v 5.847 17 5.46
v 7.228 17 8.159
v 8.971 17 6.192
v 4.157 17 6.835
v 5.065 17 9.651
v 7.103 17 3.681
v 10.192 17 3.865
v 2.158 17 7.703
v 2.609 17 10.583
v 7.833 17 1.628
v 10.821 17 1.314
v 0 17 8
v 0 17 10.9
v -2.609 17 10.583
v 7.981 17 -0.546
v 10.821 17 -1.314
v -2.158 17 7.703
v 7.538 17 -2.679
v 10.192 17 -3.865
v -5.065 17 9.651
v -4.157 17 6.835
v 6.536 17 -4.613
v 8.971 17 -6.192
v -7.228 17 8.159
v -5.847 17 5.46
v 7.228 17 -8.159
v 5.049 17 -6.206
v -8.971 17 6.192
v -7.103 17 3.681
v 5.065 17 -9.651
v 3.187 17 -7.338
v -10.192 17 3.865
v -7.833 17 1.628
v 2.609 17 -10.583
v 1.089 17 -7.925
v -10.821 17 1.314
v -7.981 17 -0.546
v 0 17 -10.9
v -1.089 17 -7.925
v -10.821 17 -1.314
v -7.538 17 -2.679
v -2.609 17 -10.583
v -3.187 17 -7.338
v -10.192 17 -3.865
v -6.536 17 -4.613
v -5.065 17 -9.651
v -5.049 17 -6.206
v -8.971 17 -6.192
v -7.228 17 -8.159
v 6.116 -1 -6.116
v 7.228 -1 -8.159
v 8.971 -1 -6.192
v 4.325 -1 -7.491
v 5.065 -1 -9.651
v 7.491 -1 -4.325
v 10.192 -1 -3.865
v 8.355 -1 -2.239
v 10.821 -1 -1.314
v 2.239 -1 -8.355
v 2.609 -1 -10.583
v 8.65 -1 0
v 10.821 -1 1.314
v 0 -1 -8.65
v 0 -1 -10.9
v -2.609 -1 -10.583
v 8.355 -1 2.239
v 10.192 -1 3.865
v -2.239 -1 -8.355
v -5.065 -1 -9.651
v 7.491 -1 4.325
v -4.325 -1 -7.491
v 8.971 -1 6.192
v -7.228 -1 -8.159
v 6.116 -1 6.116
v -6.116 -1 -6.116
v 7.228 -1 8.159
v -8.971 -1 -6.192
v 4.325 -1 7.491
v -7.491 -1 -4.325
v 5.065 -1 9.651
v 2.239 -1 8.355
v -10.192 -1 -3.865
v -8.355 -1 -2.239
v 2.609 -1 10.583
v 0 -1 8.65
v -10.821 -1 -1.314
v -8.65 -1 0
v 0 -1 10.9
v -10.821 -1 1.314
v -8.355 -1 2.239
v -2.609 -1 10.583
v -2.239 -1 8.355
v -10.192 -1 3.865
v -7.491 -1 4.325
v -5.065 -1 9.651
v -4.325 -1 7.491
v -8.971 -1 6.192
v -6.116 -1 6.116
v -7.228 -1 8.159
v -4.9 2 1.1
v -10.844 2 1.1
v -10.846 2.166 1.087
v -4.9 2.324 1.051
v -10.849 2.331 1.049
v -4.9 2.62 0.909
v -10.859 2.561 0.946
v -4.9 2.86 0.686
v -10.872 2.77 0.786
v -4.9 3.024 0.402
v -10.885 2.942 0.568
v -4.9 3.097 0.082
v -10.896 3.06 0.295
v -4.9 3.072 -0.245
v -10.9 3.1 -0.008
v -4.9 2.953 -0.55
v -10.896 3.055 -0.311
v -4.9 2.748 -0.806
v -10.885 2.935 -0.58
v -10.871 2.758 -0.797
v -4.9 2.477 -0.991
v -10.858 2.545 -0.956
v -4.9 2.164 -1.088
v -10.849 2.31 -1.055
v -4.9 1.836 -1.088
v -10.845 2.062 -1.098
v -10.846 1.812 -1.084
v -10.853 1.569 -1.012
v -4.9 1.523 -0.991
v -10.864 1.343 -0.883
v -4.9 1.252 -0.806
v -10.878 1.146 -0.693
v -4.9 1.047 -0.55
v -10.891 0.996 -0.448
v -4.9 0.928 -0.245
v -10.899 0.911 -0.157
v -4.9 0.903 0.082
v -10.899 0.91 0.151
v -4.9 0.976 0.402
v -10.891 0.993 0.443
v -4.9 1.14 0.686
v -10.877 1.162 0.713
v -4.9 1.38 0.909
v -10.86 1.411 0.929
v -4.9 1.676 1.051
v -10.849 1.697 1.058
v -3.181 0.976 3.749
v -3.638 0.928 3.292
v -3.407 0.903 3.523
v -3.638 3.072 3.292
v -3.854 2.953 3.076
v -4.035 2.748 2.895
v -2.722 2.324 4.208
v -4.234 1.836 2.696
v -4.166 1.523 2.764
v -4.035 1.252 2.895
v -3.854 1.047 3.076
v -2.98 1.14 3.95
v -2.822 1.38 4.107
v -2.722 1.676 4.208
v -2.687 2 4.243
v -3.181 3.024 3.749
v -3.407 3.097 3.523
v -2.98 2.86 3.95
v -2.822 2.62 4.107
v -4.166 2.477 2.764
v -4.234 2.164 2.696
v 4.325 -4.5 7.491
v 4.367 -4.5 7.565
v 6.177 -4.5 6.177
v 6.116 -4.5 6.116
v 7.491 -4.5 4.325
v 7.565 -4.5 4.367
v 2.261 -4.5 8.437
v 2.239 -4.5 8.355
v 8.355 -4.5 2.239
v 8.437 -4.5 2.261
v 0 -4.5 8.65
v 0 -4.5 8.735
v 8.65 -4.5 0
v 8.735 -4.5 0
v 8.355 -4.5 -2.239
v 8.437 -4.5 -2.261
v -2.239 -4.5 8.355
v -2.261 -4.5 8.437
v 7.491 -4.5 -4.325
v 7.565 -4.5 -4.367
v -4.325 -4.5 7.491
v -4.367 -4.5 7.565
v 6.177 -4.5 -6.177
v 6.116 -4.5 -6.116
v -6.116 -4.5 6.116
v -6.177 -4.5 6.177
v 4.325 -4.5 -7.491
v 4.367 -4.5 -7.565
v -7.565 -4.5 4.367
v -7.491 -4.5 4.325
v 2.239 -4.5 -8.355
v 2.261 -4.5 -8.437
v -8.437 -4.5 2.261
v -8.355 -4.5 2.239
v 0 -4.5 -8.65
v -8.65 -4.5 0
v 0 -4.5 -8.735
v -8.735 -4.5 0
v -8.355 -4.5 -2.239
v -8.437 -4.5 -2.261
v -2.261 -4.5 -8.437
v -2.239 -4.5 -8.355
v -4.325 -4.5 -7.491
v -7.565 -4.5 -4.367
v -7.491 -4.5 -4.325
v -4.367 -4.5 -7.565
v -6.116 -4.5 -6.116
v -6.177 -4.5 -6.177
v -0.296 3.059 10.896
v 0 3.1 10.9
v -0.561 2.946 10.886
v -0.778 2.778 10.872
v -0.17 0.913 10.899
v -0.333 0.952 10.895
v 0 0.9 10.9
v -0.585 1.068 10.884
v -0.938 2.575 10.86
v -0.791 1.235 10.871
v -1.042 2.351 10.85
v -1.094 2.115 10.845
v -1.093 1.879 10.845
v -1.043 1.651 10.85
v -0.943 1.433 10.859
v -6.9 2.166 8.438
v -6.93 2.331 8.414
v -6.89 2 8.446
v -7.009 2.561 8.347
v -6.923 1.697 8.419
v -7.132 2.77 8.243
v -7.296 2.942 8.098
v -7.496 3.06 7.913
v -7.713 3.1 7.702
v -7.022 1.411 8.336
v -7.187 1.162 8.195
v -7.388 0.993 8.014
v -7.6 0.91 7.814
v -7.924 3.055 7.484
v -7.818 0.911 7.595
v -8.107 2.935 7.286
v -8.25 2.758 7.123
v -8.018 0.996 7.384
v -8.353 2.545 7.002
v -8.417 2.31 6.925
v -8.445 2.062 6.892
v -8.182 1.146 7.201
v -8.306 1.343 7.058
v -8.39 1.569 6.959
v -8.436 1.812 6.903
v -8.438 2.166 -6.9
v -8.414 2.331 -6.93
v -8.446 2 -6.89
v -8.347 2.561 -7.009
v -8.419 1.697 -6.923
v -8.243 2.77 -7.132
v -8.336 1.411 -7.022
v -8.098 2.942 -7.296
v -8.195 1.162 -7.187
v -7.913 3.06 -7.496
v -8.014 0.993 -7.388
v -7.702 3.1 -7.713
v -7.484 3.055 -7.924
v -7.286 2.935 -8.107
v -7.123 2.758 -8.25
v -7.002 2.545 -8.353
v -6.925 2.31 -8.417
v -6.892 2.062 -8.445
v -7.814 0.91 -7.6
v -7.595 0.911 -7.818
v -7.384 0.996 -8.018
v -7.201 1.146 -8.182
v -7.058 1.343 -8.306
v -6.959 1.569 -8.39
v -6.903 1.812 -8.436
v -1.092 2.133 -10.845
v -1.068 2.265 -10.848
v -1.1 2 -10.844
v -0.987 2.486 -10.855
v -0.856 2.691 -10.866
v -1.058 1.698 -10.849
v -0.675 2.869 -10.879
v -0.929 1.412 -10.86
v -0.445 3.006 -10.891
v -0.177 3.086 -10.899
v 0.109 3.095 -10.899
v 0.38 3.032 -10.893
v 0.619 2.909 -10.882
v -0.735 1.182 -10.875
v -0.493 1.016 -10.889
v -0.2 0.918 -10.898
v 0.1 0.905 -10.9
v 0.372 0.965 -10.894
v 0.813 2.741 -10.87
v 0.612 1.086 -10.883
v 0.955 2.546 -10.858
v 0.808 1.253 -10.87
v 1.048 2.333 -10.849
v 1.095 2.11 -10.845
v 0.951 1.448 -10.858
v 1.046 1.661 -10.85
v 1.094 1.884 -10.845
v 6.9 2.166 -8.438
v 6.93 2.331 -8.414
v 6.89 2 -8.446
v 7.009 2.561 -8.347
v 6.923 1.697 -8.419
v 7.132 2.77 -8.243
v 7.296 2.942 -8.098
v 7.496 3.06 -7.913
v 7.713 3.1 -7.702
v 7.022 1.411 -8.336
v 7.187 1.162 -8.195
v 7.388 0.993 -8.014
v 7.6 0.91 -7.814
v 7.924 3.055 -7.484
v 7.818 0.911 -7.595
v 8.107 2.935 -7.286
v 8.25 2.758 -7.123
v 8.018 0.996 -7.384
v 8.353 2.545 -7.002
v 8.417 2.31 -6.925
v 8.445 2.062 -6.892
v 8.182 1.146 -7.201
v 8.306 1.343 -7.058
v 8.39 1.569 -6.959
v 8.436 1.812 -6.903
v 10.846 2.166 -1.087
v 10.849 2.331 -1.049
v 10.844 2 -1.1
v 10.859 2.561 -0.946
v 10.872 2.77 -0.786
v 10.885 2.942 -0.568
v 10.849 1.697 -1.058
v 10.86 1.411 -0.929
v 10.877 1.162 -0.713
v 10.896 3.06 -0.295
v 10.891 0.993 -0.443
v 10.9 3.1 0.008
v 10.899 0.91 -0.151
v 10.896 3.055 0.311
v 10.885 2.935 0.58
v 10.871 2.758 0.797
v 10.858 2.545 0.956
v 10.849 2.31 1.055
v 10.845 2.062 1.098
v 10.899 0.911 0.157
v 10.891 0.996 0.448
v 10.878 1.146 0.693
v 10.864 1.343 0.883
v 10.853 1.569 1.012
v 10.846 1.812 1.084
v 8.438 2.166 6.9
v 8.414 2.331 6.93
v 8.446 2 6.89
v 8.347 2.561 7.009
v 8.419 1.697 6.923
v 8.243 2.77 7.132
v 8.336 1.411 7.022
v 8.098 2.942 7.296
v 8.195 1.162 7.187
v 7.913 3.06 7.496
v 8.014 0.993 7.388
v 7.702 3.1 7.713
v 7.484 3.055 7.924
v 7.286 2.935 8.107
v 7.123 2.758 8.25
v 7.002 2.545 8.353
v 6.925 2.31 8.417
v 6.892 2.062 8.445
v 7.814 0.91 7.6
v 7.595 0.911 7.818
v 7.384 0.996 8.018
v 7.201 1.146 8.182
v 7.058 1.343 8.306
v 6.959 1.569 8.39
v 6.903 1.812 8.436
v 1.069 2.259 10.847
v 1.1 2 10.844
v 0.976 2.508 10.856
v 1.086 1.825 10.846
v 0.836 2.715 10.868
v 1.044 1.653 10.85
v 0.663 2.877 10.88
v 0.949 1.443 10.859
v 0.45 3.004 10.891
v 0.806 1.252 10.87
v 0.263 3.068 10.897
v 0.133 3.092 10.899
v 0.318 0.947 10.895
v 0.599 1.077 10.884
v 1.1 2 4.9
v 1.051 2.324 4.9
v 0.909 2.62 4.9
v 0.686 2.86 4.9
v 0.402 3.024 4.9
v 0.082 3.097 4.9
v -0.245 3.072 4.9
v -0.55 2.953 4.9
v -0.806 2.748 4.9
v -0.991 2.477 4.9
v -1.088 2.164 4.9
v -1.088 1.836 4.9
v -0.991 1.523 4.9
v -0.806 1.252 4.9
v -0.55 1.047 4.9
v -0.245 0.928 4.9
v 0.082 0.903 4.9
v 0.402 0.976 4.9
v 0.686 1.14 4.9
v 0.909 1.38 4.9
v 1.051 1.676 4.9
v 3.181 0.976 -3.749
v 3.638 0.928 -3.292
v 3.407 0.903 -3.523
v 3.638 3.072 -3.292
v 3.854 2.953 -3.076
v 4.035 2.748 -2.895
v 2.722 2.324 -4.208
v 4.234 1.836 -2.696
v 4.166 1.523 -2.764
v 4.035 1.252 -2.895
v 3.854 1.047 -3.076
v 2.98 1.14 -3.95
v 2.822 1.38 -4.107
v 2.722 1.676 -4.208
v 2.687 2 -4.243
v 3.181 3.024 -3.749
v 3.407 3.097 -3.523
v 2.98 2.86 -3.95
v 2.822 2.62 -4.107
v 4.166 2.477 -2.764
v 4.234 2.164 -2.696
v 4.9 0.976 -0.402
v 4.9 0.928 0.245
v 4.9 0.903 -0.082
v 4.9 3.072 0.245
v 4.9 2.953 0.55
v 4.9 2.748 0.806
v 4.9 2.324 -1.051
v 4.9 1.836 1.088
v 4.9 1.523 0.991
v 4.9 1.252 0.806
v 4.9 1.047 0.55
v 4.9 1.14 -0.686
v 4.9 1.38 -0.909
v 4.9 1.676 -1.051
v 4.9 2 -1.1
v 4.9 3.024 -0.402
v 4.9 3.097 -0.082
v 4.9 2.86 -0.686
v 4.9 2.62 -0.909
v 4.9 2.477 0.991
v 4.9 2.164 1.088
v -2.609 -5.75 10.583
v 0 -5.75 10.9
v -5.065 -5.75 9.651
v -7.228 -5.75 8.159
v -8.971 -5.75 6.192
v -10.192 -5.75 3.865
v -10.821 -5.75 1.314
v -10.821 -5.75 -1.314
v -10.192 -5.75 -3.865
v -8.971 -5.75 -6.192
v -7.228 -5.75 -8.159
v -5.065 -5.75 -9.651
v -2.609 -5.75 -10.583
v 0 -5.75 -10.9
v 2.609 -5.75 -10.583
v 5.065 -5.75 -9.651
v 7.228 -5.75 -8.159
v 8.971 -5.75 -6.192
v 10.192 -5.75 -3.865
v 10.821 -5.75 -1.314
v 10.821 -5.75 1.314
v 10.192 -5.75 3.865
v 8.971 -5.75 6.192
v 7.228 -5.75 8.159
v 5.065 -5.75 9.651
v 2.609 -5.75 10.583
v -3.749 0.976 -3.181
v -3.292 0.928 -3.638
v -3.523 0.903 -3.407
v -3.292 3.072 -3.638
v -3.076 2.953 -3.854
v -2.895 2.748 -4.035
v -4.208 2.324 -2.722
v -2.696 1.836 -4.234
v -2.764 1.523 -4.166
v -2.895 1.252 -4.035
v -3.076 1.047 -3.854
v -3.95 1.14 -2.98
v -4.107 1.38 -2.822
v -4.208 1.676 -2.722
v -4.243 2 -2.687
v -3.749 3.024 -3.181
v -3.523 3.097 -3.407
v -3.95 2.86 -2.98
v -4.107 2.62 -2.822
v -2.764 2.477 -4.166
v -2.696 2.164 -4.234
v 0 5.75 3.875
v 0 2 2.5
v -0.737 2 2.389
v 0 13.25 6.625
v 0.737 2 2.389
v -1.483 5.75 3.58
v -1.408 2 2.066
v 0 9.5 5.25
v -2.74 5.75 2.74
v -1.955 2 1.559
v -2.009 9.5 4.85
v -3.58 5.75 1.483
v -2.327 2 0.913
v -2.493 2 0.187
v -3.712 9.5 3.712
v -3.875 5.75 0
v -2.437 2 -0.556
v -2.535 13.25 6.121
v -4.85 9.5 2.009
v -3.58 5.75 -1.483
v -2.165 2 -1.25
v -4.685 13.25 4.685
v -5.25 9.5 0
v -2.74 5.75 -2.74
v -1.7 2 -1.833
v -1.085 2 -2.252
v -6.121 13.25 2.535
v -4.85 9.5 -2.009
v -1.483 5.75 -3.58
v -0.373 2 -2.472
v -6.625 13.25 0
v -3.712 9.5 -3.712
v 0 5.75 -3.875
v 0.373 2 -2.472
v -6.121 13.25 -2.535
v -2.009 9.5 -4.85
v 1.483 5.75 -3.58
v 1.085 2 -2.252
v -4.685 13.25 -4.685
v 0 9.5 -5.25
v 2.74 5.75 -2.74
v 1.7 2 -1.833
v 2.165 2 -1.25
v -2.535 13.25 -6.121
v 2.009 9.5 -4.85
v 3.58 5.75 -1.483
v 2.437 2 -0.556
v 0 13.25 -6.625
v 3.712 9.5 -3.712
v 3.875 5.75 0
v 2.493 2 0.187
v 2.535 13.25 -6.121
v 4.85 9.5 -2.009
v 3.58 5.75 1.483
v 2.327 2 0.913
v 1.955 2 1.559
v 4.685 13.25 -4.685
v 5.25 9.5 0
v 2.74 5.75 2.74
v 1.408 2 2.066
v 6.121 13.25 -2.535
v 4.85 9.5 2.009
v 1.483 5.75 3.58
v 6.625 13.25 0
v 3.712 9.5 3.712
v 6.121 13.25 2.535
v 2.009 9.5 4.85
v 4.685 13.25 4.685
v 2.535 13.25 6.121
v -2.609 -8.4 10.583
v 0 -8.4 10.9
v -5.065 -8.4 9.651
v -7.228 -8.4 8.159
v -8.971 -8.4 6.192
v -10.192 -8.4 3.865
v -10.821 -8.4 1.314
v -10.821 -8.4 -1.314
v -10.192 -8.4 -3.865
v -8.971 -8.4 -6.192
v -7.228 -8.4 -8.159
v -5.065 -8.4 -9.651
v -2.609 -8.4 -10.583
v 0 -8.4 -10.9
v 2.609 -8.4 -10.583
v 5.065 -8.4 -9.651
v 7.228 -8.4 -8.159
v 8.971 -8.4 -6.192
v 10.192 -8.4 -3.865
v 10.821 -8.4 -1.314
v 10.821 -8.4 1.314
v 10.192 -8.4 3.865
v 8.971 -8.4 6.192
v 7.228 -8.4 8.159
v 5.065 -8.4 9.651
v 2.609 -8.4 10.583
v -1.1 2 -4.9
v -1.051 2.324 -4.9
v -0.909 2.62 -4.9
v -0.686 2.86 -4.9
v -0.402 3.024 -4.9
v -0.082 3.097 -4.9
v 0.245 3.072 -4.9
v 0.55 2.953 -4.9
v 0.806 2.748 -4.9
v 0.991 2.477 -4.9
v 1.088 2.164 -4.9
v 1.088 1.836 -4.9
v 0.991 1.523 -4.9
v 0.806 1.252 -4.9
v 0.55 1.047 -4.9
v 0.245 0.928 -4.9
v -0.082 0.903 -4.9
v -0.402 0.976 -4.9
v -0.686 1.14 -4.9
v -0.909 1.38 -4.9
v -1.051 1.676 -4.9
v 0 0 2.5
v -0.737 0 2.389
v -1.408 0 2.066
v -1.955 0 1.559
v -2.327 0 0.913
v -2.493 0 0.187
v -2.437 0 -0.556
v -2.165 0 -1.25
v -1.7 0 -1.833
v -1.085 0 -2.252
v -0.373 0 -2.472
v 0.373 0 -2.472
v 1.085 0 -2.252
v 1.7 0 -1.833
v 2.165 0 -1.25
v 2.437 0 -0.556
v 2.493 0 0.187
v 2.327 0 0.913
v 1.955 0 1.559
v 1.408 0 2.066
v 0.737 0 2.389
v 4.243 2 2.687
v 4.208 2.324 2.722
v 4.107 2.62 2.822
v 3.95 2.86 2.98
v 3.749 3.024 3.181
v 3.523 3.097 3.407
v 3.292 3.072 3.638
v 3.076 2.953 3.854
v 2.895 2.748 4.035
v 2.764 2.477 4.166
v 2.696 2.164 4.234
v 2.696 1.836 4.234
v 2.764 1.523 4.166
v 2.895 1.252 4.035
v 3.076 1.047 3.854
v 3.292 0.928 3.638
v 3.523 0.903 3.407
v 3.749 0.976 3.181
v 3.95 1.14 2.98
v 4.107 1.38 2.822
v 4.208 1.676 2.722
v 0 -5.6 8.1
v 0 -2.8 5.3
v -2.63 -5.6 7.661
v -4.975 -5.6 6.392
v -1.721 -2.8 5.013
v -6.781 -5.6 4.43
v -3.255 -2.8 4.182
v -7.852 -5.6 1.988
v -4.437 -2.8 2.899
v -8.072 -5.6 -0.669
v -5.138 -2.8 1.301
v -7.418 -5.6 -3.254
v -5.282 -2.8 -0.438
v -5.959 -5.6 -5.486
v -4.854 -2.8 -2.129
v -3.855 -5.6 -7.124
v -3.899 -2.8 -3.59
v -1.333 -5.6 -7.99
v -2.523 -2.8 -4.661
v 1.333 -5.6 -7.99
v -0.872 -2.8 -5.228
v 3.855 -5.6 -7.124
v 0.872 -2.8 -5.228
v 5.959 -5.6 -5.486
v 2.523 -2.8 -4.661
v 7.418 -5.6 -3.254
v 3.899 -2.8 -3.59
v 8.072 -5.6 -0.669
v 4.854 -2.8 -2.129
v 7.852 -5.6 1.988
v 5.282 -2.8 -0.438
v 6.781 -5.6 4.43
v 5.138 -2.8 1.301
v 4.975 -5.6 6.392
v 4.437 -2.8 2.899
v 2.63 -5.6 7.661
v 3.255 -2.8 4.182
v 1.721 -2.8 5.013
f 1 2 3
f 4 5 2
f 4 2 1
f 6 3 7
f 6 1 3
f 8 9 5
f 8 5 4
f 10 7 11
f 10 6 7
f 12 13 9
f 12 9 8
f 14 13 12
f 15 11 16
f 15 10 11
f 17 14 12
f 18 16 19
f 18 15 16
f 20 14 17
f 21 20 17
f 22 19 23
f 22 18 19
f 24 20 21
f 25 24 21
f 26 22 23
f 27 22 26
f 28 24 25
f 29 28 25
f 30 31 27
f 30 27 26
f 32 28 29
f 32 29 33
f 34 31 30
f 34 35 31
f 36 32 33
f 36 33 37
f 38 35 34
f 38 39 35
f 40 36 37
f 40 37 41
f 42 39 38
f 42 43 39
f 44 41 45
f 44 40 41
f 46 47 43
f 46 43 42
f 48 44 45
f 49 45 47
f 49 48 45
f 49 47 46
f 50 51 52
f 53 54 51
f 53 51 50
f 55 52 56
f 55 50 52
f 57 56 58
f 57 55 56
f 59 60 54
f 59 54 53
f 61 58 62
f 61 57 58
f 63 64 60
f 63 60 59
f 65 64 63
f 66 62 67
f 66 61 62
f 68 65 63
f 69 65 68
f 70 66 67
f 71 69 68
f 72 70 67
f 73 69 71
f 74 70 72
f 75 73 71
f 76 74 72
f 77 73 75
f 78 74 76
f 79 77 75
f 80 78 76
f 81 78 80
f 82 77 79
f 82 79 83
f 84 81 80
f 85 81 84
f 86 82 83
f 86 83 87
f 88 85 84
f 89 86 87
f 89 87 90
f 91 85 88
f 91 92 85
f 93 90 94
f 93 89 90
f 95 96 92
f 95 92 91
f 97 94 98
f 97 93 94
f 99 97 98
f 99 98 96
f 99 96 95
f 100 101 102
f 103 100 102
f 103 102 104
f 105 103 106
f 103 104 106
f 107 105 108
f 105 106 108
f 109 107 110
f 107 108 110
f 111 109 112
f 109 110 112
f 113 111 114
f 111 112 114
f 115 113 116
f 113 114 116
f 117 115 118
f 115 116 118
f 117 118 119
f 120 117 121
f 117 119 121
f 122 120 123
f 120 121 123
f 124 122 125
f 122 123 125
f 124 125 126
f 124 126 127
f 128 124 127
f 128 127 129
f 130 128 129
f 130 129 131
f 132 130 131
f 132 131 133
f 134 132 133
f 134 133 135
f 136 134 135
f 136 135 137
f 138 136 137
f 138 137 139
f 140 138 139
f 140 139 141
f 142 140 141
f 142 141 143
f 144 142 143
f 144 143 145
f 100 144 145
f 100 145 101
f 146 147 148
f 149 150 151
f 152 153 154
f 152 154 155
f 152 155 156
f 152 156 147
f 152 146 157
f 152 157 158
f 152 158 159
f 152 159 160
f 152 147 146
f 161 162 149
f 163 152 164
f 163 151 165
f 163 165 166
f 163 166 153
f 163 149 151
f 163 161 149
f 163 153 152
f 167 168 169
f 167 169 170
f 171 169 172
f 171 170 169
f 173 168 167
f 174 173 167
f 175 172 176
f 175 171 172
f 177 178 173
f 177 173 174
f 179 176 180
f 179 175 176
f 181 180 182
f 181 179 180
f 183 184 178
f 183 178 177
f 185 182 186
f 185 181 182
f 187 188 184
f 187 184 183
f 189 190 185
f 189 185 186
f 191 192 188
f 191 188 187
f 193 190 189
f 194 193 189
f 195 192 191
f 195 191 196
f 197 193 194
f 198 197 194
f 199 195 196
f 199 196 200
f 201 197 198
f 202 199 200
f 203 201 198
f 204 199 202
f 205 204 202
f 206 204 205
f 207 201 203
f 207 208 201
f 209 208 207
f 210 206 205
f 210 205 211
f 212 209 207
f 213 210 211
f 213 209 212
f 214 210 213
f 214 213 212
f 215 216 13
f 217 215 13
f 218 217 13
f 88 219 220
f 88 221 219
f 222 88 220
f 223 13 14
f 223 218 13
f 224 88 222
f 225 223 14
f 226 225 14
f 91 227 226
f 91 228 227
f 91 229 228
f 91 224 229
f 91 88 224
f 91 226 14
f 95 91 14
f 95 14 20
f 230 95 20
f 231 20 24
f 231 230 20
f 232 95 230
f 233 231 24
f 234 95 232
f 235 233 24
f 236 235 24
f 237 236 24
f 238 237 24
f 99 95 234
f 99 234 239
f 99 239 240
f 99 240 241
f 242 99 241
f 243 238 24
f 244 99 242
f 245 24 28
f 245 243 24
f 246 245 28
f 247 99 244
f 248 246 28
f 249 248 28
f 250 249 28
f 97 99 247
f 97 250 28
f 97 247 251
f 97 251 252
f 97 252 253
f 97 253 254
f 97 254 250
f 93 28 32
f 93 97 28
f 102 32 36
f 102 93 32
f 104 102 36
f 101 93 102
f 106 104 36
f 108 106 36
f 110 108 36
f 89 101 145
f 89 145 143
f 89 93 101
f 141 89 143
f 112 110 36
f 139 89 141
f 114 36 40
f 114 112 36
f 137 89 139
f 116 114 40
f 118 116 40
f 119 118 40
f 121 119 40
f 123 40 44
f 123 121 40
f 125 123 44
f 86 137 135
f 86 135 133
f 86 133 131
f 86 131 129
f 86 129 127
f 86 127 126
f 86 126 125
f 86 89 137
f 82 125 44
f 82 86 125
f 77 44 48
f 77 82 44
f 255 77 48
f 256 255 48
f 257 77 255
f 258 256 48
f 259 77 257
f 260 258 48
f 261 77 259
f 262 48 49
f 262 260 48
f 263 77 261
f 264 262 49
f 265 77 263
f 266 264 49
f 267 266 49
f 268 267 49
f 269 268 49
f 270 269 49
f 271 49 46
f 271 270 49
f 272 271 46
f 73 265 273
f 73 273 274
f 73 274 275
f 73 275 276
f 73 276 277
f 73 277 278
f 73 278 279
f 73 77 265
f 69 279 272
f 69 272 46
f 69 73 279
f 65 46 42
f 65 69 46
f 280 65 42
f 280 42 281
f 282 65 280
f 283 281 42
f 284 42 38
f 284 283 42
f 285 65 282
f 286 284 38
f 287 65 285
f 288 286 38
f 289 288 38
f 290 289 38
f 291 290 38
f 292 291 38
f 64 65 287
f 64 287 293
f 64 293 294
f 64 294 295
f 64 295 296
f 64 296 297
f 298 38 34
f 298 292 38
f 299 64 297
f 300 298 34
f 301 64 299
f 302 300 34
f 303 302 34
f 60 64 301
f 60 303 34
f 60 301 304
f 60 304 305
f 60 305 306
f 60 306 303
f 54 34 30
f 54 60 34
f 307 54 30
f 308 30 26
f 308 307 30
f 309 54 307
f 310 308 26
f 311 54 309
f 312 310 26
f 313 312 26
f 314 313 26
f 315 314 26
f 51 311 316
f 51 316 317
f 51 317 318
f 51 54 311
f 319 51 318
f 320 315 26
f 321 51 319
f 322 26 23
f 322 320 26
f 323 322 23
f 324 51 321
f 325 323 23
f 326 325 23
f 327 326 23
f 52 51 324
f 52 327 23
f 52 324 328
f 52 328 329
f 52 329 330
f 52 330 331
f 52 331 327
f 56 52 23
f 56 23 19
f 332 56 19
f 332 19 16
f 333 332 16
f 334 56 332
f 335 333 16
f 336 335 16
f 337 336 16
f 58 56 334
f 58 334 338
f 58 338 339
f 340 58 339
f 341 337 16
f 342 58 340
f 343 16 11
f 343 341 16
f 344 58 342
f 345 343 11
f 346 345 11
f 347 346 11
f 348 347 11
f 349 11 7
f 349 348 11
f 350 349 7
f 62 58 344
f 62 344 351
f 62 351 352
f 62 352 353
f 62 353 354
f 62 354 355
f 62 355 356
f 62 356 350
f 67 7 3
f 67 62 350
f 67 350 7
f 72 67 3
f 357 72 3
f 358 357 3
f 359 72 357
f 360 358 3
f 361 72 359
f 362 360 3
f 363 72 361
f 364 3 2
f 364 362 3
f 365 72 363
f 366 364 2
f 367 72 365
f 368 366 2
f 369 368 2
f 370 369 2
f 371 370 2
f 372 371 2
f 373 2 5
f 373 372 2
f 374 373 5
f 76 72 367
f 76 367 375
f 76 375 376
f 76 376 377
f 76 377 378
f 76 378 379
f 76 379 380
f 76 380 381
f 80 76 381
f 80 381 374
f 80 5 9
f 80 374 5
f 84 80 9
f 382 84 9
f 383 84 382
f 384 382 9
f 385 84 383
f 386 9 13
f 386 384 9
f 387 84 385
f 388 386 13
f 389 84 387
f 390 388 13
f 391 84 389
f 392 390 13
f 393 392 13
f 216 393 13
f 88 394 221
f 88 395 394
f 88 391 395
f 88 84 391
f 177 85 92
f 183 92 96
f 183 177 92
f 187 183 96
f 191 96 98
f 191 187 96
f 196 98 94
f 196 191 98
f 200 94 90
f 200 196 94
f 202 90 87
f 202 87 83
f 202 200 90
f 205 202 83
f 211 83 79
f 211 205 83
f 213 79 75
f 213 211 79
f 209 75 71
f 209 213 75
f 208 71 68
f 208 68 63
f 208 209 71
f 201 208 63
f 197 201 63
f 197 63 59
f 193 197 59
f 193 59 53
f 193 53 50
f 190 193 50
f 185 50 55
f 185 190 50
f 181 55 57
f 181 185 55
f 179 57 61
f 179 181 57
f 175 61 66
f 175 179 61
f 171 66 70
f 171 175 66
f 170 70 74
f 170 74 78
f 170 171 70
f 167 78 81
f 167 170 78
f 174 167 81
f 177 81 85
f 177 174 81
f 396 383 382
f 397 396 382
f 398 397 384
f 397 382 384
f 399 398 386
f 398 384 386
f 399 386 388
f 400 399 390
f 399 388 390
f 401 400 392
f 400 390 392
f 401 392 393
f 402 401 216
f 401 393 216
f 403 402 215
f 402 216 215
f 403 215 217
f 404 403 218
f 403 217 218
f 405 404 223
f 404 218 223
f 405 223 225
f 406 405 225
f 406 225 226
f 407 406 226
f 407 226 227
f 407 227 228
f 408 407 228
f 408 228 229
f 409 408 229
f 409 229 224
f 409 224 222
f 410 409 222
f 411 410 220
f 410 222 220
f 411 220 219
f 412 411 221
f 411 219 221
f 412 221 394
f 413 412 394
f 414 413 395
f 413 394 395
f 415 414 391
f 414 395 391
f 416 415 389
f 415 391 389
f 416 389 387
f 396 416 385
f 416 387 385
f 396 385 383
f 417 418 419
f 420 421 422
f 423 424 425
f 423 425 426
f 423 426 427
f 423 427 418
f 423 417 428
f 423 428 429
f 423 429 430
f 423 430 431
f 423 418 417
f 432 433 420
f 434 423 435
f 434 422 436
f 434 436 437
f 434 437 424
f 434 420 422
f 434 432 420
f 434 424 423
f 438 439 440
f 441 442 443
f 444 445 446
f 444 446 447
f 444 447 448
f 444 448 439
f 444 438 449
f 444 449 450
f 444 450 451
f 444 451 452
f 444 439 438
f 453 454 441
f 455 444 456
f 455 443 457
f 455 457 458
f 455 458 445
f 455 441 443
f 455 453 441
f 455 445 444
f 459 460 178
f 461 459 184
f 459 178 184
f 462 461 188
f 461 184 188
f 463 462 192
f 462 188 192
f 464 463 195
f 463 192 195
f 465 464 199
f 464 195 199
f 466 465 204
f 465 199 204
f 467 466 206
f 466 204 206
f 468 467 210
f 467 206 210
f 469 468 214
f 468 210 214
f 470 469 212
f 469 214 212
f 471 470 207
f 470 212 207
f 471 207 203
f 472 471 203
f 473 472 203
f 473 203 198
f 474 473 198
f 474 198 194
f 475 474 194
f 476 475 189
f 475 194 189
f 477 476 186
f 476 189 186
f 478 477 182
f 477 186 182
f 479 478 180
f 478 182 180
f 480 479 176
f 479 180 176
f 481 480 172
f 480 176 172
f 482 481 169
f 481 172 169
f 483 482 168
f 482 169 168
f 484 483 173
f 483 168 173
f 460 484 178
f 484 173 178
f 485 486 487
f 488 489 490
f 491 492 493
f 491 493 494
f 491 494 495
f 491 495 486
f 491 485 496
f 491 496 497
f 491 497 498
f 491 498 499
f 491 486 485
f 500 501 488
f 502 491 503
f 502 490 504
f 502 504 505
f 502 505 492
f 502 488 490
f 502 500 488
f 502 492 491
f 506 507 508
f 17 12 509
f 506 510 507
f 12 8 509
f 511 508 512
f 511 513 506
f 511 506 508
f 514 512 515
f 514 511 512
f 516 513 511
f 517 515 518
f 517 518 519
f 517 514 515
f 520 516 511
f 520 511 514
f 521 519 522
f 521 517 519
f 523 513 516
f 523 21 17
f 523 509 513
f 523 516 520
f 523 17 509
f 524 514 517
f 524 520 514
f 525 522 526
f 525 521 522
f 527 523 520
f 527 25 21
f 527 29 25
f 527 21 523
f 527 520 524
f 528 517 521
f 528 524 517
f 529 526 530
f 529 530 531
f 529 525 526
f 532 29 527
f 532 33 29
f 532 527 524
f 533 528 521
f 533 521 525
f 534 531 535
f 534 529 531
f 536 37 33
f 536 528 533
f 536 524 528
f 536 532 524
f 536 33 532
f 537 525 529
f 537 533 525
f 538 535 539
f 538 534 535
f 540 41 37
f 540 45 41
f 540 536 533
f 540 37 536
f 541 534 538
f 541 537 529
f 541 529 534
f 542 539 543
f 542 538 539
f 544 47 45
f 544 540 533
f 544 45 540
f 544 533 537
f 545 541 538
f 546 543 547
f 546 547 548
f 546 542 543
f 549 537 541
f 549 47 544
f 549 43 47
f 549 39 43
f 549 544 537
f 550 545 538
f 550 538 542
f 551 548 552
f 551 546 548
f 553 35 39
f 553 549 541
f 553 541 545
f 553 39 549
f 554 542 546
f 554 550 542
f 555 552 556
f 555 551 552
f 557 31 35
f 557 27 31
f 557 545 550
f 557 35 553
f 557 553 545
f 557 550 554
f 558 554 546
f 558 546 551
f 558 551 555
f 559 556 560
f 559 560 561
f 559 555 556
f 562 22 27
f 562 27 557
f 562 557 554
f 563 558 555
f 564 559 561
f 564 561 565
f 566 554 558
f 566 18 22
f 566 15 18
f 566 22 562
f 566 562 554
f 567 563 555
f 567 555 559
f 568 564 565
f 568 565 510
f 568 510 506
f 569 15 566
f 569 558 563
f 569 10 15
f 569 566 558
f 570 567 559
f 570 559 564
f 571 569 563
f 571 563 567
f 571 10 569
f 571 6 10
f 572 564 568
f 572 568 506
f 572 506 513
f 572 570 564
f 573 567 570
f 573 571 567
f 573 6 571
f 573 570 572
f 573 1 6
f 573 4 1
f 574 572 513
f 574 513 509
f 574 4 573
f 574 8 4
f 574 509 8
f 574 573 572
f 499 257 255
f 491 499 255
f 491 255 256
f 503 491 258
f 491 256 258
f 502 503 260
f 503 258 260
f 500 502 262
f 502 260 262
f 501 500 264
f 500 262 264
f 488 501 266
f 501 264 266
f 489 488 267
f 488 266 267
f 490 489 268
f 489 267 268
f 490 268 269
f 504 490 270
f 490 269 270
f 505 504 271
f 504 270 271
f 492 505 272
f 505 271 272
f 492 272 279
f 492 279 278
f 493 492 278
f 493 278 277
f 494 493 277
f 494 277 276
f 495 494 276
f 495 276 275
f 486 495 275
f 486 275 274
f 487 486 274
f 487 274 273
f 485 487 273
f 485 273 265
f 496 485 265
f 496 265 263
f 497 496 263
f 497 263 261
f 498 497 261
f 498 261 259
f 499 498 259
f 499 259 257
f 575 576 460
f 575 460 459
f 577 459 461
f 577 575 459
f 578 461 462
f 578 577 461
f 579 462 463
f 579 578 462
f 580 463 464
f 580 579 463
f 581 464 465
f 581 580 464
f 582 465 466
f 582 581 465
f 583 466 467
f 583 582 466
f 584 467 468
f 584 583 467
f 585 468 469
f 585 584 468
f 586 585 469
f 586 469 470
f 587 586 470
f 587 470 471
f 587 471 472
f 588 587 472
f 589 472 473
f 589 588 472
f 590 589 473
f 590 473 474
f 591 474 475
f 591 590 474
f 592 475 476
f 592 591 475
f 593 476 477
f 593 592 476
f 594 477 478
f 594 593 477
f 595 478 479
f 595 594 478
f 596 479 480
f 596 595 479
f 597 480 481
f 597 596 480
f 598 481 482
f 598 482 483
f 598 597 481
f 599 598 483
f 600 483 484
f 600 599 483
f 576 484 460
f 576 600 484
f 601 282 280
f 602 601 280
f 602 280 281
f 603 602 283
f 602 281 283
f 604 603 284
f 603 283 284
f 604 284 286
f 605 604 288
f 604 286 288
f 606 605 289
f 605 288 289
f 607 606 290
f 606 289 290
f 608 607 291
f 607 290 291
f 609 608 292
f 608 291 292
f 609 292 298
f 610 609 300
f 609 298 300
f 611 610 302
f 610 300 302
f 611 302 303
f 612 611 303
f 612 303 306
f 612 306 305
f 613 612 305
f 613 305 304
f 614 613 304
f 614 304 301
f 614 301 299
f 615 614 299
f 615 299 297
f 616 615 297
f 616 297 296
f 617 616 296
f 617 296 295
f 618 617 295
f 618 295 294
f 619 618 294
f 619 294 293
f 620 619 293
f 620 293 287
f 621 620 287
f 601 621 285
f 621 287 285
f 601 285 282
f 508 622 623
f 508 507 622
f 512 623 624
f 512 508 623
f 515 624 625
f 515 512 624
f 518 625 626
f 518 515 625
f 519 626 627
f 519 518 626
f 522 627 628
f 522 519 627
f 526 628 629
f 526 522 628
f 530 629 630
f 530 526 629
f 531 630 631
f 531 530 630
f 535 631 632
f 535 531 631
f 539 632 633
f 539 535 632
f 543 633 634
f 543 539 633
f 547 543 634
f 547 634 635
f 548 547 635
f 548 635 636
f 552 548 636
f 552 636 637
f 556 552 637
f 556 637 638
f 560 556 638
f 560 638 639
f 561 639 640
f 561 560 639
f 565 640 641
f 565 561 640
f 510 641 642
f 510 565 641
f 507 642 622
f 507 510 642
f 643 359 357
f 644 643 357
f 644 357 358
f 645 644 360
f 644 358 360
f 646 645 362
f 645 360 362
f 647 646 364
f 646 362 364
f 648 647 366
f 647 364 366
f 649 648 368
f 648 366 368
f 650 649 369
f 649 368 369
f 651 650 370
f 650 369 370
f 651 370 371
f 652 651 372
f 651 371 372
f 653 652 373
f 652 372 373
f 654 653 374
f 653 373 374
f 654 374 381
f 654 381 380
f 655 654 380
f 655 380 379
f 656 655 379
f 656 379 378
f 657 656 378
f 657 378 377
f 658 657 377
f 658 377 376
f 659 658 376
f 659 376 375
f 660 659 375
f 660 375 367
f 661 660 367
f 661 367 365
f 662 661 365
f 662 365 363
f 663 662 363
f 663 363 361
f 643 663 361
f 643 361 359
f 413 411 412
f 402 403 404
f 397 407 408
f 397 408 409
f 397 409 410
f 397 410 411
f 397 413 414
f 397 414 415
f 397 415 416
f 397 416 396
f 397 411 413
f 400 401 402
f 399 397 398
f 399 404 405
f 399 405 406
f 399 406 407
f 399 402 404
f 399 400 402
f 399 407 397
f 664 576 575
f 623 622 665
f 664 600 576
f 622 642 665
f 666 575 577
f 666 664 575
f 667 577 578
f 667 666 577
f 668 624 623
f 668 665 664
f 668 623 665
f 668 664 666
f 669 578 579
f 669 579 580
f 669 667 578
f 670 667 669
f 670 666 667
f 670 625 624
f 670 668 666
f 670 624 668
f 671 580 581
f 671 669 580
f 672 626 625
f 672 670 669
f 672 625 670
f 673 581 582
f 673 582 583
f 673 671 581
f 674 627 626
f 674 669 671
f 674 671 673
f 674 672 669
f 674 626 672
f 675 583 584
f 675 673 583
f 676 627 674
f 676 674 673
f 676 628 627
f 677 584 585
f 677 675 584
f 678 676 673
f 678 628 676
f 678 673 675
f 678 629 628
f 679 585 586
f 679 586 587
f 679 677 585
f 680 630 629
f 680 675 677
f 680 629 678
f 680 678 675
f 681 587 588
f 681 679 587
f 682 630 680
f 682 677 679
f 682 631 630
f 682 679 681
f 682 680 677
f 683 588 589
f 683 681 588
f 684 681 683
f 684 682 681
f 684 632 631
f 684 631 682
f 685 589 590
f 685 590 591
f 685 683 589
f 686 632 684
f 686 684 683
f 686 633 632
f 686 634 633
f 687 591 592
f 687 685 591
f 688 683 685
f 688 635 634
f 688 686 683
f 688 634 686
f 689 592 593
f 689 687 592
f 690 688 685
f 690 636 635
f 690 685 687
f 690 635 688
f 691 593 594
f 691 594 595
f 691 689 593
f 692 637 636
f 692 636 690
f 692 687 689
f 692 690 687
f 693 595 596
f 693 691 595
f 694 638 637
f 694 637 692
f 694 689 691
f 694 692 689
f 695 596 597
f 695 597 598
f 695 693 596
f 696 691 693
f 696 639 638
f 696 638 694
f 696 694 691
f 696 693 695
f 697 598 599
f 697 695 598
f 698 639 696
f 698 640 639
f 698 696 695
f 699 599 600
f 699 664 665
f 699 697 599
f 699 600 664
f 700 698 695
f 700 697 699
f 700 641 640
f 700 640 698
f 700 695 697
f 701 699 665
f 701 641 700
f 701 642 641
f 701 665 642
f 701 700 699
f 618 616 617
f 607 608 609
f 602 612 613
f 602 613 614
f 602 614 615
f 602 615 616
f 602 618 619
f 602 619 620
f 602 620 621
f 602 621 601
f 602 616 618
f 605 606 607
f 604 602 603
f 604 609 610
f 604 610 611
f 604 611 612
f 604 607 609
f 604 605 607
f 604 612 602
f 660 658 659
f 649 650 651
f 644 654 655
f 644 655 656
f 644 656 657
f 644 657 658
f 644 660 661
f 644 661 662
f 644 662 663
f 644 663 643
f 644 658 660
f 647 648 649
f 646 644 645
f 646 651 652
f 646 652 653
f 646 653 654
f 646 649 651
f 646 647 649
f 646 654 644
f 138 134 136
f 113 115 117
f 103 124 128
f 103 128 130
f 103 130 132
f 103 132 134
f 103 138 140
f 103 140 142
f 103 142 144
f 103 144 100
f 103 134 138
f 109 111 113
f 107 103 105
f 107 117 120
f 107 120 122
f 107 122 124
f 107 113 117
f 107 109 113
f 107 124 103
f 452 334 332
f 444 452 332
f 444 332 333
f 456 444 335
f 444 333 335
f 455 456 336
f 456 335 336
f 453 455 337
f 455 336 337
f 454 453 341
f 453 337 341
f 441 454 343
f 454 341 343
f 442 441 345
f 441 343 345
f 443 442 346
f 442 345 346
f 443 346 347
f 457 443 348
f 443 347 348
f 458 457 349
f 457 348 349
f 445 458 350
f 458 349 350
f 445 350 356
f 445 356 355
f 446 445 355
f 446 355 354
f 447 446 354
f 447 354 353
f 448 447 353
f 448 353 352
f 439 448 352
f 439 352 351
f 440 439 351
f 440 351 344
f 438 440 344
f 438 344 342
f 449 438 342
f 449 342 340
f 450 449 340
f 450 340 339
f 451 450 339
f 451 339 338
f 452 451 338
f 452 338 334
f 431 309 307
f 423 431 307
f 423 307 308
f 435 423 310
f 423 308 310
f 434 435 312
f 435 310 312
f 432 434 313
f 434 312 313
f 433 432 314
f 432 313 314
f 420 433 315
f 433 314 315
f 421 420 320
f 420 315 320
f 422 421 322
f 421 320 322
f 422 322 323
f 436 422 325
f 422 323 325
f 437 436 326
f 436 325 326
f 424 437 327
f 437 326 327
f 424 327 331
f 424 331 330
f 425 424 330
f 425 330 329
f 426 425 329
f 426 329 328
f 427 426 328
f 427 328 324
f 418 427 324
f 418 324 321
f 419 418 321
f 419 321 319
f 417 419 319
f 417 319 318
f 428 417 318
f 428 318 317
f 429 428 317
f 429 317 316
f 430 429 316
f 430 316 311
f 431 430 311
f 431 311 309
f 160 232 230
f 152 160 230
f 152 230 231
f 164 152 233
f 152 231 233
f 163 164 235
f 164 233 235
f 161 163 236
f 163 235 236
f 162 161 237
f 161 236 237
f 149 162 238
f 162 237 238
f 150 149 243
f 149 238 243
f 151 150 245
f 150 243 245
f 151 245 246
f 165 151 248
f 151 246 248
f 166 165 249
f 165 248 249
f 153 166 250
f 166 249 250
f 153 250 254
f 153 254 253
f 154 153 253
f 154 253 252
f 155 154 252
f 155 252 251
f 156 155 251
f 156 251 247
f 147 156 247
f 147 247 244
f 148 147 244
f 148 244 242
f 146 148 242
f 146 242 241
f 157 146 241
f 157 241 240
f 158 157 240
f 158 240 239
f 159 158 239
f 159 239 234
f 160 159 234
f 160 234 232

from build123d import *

# Parameters (mm, degrees)
SKETCH3_R          = 1.1
CUT_EXTRUDE1_DEPTH = 6
CIRPATTERN1_COUNT  = 8
CHAMFER2_SIZE      = 1.25
CHAMFER2_SIZE2     = 2.165063509


with BuildPart() as part:
    # Sketch2 → Revolve1 (revolve)
    with BuildSketch(Plane.XY):
        Polygon((-2.5, 0), (-2.5, 2), (-8, 17), (-10.9, 17), (-10.9, 2), (-10.9, -1), (-8.65, -1), (-8.65, -4.5), (-10.9, -4.5), (-10.9, -8.4), align=None)
    revolve(axis=Axis((0, 19.141519074, 0), (0, -1, 0)))

    # Sketch3 → Cut-Extrude1 (cut)
    with BuildSketch(Plane.ZY.offset(10.9)):
        with Locations((0, 2)):
            Circle(SKETCH3_R)
    cut_extrude1 = extrude(amount=-CUT_EXTRUDE1_DEPTH, mode=Mode.SUBTRACT)

    # CirPattern1: Cut-Extrude1 ×8 about axis
    cirpattern1_axis = Axis((0, 0, 0), (0, 1, 0))
    for i in range(1, CIRPATTERN1_COUNT):
        add(cut_extrude1.rotate(cirpattern1_axis, i * 360 / CIRPATTERN1_COUNT), mode=Mode.SUBTRACT)

    # Chamfer2
    chamfer2_edges = [part.edges().sort_by_distance(p)[0] for p in [
        (10.9, -4.5, 0),
    ]]
    chamfer2_side = [part.faces().sort_by_distance(p)[0] for p in [
        (10.9, -6.45, 0),
    ]]
    chamfer(chamfer2_edges, length=CHAMFER2_SIZE, length2=CHAMFER2_SIZE2, reference=chamfer2_side[0])


solid = part.part
